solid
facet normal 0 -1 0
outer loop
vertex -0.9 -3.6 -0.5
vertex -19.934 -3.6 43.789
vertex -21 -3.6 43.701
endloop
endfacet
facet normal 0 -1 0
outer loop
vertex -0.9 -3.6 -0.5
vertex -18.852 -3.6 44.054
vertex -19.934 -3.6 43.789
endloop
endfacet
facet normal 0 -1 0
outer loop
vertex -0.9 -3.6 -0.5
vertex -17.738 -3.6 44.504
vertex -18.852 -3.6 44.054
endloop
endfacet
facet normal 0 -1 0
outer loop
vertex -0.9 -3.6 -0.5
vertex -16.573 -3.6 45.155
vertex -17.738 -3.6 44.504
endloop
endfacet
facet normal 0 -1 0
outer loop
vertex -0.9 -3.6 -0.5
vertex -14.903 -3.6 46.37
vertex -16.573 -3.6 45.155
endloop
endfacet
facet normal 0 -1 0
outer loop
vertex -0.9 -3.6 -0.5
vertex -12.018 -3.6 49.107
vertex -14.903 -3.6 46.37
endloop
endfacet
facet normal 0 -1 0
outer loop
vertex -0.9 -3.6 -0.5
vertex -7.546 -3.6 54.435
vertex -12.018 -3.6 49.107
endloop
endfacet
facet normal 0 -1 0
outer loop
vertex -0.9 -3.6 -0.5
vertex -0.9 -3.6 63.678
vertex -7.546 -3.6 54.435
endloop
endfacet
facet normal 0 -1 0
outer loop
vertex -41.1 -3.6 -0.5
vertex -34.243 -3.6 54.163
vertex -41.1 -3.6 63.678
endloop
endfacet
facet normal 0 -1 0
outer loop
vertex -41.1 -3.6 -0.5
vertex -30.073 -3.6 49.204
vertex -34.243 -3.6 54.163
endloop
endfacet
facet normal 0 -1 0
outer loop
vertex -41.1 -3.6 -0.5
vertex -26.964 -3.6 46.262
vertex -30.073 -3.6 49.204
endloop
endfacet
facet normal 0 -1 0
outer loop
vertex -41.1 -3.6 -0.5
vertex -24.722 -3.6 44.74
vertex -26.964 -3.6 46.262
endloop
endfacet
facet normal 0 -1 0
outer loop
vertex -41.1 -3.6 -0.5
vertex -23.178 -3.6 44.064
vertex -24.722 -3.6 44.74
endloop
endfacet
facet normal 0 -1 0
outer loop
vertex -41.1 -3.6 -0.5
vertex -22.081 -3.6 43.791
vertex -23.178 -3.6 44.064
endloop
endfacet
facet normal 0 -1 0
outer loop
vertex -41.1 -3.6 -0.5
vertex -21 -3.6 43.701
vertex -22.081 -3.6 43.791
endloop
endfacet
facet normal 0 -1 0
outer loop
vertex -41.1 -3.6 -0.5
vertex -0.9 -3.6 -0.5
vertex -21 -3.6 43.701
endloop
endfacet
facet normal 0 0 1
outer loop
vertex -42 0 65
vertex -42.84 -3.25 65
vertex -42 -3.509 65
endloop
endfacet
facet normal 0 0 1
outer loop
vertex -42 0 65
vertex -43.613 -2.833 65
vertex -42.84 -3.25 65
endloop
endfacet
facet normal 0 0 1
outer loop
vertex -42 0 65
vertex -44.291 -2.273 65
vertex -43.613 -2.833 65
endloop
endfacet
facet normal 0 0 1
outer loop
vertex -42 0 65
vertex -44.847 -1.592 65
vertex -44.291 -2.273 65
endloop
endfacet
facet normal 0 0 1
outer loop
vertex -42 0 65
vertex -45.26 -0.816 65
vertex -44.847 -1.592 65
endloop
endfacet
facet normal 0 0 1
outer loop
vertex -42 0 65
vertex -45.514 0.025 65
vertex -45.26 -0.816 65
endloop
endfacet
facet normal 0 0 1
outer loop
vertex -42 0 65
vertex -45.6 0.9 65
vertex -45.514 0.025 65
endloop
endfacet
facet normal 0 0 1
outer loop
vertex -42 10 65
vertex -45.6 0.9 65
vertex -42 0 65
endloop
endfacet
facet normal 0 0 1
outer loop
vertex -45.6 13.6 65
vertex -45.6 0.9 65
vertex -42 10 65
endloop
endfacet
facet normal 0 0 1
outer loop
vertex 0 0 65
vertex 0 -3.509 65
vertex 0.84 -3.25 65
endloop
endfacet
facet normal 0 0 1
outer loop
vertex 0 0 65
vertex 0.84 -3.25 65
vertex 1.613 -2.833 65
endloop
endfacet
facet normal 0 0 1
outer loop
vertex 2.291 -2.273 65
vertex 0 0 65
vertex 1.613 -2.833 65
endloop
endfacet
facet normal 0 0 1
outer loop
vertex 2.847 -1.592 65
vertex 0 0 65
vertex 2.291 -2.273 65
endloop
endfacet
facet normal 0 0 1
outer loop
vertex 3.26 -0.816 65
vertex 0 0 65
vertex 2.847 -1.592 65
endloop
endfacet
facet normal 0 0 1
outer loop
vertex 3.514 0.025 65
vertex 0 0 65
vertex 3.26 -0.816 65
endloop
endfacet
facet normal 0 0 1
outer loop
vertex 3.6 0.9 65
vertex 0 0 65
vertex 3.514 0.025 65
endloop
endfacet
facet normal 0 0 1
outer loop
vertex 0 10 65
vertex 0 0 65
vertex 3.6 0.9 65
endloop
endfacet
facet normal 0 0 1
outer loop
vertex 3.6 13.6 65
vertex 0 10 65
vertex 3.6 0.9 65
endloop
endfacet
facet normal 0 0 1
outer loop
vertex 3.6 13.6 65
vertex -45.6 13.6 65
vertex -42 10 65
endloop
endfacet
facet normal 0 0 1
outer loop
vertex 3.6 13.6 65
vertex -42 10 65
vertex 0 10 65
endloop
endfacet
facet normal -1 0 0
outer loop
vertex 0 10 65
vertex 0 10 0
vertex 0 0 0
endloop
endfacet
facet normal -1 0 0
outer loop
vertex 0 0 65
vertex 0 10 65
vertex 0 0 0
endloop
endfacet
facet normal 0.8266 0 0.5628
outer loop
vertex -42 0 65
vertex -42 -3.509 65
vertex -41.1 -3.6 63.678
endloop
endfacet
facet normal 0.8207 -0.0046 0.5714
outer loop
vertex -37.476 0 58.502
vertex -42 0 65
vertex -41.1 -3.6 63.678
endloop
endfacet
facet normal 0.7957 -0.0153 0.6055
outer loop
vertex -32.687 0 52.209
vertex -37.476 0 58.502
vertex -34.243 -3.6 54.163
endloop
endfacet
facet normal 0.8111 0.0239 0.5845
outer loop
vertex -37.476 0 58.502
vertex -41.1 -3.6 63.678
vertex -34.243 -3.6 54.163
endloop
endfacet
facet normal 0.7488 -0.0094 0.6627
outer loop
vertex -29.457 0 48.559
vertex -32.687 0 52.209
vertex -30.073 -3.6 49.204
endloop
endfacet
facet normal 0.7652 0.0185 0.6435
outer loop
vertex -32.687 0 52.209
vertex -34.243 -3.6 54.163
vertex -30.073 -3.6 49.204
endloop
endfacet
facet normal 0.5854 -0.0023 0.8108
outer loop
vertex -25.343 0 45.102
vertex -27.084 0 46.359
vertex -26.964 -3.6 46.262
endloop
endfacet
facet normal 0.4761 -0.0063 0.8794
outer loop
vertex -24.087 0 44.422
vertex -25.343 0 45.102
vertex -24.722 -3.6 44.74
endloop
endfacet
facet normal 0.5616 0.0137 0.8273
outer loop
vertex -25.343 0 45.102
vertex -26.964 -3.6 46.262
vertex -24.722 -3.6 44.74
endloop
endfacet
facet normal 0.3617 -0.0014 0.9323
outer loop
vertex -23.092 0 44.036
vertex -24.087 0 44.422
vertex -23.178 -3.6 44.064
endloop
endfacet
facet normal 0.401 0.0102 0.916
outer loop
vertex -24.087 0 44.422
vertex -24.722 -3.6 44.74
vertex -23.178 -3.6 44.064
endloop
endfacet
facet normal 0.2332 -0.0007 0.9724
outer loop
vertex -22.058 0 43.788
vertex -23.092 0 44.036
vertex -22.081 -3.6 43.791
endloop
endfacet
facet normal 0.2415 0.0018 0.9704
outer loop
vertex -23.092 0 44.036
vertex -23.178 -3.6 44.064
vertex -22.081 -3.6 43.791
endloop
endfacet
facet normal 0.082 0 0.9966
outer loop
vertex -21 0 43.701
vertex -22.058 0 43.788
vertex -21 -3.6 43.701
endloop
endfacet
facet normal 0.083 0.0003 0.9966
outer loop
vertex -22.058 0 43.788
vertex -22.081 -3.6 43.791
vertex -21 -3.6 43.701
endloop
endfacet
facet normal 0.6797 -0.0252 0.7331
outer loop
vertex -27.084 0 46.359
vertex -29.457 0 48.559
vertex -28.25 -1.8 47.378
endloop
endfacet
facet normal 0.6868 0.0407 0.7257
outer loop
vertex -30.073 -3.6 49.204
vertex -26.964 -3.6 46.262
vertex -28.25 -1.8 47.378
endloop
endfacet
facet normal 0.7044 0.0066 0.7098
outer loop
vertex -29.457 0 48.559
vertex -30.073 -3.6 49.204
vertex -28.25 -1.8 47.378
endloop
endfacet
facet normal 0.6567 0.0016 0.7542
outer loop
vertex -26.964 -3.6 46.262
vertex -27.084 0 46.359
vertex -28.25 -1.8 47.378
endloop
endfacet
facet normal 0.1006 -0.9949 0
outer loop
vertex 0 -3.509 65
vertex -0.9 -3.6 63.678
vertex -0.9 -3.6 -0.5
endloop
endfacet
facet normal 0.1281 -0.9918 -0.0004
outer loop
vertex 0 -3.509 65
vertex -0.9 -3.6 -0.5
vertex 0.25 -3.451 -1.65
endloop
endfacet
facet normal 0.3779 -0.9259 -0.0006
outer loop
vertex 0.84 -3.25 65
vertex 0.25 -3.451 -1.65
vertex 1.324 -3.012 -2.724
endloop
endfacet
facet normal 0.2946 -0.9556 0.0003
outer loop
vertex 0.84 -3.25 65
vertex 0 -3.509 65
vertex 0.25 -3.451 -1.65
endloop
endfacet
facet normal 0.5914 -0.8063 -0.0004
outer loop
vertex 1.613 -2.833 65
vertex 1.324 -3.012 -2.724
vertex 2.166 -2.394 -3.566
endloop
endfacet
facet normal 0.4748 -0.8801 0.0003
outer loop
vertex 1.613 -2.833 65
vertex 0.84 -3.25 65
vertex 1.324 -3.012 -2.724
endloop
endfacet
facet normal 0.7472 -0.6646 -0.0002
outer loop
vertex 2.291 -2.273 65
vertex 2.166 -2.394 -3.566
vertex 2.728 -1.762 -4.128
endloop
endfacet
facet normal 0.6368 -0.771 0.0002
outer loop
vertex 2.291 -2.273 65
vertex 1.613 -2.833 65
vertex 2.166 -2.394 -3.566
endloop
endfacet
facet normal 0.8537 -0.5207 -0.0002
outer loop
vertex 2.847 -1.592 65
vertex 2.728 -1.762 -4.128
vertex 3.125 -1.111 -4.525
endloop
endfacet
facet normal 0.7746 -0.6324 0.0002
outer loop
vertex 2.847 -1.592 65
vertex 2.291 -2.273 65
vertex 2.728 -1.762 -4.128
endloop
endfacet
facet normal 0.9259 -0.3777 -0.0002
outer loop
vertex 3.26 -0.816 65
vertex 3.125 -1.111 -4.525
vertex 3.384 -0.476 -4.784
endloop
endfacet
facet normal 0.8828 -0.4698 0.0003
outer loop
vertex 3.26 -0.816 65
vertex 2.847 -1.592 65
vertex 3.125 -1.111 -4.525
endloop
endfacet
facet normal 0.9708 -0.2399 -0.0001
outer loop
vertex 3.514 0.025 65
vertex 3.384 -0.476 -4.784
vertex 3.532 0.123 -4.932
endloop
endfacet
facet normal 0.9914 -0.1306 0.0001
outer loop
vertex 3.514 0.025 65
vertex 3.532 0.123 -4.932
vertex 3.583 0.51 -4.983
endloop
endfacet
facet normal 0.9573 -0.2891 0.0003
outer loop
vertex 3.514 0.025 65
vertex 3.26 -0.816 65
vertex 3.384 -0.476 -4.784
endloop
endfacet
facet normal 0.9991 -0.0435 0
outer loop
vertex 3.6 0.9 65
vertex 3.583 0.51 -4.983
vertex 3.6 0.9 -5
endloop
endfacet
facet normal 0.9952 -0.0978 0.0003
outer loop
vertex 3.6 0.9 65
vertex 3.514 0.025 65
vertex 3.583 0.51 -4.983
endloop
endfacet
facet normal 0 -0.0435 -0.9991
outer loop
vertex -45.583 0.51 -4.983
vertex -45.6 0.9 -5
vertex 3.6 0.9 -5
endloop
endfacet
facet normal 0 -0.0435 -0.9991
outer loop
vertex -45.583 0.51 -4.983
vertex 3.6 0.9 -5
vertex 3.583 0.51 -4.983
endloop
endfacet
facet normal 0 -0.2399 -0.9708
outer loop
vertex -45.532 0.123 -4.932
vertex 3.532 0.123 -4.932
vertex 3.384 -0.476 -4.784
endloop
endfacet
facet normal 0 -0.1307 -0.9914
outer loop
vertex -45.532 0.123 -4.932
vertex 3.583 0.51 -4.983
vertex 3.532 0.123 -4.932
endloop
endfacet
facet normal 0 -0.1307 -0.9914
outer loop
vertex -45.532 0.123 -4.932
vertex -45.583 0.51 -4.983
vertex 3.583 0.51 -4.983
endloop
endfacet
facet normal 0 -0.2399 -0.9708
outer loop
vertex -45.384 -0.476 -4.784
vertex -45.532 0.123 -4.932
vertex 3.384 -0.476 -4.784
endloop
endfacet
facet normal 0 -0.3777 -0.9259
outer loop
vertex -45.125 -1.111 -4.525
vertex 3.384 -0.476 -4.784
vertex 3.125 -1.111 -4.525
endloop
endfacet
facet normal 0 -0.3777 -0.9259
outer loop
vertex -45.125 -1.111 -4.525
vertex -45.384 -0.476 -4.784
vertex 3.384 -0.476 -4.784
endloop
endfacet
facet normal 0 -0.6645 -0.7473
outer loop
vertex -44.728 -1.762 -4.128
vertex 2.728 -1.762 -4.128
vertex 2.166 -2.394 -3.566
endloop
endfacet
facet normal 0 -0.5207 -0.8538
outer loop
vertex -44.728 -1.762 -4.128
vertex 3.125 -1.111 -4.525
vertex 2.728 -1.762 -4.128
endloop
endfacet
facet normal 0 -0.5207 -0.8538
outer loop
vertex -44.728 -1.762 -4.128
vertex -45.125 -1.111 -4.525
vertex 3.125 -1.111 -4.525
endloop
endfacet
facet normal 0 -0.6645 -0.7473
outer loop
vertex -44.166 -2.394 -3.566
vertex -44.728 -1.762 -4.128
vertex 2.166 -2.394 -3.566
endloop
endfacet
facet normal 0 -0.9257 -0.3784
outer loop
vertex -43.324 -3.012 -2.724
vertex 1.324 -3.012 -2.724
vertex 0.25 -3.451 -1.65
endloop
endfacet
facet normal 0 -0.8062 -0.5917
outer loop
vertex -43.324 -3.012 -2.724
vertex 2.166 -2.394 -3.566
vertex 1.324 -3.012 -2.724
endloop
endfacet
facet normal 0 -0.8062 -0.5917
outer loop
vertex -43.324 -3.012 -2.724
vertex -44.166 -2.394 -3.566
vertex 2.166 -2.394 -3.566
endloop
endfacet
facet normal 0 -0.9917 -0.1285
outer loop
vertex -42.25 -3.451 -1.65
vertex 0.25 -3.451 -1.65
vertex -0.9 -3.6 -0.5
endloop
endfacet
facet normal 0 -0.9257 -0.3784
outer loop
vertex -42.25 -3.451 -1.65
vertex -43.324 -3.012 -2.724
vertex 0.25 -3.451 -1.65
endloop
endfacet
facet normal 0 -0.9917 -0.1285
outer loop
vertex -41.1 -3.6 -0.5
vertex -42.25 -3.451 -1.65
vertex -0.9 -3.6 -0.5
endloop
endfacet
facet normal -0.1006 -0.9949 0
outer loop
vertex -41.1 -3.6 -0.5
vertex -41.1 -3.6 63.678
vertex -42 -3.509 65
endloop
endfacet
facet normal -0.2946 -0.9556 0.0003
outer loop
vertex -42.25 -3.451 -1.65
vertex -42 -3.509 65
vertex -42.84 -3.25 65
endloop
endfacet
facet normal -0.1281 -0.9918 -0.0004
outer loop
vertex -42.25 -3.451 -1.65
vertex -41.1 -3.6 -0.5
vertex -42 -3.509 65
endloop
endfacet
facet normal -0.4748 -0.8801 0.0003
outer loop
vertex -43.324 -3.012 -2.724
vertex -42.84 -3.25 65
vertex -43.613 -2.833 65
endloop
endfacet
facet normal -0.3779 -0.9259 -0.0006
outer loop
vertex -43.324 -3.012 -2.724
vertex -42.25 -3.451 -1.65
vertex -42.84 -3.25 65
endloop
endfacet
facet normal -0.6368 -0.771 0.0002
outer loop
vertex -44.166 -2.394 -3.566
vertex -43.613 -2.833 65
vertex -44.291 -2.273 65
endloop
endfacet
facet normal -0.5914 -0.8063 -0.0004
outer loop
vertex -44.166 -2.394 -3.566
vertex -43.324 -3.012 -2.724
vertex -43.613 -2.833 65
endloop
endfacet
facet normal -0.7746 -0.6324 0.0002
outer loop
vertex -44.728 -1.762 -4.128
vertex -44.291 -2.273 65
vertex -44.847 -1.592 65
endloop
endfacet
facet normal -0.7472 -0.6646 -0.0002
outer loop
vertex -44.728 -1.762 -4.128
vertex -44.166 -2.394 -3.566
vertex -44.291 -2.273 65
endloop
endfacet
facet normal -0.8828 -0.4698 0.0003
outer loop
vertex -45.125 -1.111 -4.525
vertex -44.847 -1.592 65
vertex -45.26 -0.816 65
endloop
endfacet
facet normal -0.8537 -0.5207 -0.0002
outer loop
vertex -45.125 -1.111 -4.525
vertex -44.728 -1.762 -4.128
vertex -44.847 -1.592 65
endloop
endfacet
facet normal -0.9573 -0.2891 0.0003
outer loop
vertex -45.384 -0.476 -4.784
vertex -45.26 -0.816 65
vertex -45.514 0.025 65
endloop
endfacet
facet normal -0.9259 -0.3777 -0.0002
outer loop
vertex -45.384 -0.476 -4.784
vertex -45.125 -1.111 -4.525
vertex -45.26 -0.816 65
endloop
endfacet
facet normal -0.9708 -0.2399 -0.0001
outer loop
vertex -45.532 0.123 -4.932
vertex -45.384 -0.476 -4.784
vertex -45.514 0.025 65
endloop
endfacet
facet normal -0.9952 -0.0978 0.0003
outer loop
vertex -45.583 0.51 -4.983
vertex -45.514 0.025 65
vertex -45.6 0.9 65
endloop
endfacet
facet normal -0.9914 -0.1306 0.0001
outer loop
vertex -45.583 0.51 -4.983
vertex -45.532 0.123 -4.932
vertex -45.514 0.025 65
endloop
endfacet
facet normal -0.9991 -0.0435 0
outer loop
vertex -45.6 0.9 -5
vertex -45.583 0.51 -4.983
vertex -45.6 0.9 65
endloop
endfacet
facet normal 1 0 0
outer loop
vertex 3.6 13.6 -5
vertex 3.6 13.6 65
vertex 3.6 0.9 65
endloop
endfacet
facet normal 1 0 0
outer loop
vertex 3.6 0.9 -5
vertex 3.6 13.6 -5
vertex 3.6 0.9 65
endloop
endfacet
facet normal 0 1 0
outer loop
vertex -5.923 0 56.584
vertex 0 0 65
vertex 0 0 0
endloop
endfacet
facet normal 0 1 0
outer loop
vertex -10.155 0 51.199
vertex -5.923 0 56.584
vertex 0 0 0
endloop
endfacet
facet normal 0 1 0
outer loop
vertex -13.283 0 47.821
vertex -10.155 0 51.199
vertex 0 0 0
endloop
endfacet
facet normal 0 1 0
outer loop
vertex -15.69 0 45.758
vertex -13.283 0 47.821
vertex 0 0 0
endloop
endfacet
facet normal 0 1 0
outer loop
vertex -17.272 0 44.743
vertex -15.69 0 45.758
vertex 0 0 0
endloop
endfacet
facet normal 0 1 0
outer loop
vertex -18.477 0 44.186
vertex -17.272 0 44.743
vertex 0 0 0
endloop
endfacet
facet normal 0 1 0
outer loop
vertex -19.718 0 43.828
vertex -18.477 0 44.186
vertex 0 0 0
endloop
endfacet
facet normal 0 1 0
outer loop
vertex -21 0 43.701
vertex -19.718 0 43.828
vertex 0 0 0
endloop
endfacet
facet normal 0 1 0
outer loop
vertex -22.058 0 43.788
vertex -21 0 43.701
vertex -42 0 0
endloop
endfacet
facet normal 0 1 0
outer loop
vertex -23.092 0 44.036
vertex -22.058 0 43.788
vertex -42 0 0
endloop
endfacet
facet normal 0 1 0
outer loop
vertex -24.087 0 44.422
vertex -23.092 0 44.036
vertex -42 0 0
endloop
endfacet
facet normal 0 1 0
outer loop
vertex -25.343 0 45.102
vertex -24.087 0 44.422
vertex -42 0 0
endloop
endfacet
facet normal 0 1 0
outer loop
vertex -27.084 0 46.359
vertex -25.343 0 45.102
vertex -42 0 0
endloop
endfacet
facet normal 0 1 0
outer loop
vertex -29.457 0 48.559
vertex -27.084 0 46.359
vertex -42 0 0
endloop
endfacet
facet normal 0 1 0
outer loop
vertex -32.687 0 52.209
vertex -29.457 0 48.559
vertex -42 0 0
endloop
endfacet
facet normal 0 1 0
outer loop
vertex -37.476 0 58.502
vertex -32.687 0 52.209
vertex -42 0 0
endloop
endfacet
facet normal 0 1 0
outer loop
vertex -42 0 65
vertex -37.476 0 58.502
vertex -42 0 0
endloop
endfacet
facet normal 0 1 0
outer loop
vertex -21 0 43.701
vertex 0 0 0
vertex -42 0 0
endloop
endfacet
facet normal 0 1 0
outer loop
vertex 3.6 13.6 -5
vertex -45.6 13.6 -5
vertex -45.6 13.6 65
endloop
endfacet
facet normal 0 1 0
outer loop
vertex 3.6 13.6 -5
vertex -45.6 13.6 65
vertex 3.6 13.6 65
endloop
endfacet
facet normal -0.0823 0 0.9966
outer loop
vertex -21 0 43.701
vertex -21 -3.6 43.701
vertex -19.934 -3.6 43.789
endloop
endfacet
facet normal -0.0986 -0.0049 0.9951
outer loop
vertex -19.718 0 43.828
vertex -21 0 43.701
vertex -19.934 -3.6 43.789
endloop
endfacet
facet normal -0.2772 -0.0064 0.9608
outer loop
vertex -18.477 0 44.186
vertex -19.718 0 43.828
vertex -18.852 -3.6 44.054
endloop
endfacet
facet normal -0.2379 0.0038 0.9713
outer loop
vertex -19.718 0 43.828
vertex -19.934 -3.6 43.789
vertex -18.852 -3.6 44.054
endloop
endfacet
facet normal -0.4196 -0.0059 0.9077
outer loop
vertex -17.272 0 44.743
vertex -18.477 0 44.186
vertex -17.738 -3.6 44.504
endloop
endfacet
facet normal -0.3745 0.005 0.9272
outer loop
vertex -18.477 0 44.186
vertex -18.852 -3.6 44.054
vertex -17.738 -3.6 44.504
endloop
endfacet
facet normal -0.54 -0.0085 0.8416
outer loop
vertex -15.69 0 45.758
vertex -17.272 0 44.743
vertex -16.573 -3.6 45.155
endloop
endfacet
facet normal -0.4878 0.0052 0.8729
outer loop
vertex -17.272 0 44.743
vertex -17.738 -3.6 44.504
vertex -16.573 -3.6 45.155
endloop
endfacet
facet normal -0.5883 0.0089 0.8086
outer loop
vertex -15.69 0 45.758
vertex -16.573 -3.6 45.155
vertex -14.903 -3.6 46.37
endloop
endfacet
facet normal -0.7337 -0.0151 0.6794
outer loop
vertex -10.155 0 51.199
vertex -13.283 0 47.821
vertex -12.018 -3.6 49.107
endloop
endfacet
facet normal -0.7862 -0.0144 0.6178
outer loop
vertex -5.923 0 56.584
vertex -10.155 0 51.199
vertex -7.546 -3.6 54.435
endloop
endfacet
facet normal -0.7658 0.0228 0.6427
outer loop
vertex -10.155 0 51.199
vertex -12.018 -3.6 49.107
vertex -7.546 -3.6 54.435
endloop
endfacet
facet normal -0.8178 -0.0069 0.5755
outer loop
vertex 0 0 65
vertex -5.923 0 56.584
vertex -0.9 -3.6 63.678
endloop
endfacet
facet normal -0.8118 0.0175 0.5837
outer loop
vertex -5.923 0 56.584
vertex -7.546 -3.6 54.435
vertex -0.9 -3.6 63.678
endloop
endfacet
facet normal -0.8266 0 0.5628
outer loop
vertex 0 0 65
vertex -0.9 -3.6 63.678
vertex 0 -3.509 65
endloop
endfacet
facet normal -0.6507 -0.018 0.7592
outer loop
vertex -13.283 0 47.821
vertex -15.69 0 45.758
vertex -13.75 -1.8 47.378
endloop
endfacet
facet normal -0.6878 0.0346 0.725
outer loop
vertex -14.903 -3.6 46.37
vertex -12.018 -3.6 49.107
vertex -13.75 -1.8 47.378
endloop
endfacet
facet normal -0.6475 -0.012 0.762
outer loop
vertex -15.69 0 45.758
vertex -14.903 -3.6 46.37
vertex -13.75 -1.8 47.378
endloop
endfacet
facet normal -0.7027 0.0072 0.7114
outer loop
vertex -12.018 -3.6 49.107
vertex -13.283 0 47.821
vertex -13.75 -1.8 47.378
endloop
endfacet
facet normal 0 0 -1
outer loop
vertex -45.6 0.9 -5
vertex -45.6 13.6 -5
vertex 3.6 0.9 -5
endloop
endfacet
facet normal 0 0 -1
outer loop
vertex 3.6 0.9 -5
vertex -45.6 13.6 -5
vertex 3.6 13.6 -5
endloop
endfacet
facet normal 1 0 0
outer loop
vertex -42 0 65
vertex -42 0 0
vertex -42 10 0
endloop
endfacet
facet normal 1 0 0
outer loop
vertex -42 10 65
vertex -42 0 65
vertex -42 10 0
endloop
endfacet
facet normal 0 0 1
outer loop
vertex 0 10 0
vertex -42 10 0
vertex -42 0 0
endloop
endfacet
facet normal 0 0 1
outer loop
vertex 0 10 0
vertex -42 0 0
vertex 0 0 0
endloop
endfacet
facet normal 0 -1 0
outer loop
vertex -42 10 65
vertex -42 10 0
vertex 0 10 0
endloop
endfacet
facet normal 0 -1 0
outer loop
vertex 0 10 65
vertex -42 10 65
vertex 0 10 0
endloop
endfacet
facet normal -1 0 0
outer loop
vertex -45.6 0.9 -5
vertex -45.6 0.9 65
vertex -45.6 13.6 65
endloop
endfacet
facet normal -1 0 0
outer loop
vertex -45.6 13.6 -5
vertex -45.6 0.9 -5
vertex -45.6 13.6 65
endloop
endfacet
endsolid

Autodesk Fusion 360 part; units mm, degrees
sketch "Sketch1" plane through (0, 0, 0) normal (0, 0, 1) x (1, 0, 0)
  line L0 (0, 0) -> (-42, 0)
  line L1 (-42, 0) -> (-42, 10)
  line L2 (-42, 10) -> (0, 10)
  line L3 (0, 10) -> (0, 0)
  line L4 (3.6, -3.6) -> (-45.6, -3.6)
  line L5 (-45.6, -3.6) -> (-45.6, 13.6)
  line L6 (-45.6, 13.6) -> (3.6, 13.6)
  line L7 (3.6, 13.6) -> (3.6, -3.6)
  dimension "d1" = 42
  dimension "d2" = 10
  dimension "d3" = -3.6
extrude "Extrude1" add sketch "Sketch1" along normal blind 65
extrude "Extrude2" add sketch "Sketch1" against normal blind 5 contours L0 L1 L2 L3 | L4 L5 L6 L7
sketch "Sketch2" plane through (0, -3.6, 0) normal (0, -1, 0) x (1, 0, 0)
  line L0 (3.6, -5) -> (3.6, 65)
  line L1 (3.6, 65) -> (-45.6, 65)
  line L2 (-45.6, 65) -> (-45.6, -5)
  line L3 (-45.6, -5) -> (3.6, -5)
  curve L4
  curve L5
  line L6 (-21, 65) -> (-21, -5)
  spline S0 degree 2 poles (-42, 65) (-21, 34) (0, 65) knots 0 0 0 5.982089 5.982089 5.982089 weights 1 2.19545 1
  point P0 (0, 65)
  point P1 (-42, 65)
extrude "Extrude3" cut sketch "Sketch2" against normal blind 13.6 contours L1 L6 S0 | L1 L6 S0
fillet "Fillet1" radius 4.5 3 edges at (-45.6, -3.6, 30) (-21, -3.6, -5) (3.6, -3.6, 30)
